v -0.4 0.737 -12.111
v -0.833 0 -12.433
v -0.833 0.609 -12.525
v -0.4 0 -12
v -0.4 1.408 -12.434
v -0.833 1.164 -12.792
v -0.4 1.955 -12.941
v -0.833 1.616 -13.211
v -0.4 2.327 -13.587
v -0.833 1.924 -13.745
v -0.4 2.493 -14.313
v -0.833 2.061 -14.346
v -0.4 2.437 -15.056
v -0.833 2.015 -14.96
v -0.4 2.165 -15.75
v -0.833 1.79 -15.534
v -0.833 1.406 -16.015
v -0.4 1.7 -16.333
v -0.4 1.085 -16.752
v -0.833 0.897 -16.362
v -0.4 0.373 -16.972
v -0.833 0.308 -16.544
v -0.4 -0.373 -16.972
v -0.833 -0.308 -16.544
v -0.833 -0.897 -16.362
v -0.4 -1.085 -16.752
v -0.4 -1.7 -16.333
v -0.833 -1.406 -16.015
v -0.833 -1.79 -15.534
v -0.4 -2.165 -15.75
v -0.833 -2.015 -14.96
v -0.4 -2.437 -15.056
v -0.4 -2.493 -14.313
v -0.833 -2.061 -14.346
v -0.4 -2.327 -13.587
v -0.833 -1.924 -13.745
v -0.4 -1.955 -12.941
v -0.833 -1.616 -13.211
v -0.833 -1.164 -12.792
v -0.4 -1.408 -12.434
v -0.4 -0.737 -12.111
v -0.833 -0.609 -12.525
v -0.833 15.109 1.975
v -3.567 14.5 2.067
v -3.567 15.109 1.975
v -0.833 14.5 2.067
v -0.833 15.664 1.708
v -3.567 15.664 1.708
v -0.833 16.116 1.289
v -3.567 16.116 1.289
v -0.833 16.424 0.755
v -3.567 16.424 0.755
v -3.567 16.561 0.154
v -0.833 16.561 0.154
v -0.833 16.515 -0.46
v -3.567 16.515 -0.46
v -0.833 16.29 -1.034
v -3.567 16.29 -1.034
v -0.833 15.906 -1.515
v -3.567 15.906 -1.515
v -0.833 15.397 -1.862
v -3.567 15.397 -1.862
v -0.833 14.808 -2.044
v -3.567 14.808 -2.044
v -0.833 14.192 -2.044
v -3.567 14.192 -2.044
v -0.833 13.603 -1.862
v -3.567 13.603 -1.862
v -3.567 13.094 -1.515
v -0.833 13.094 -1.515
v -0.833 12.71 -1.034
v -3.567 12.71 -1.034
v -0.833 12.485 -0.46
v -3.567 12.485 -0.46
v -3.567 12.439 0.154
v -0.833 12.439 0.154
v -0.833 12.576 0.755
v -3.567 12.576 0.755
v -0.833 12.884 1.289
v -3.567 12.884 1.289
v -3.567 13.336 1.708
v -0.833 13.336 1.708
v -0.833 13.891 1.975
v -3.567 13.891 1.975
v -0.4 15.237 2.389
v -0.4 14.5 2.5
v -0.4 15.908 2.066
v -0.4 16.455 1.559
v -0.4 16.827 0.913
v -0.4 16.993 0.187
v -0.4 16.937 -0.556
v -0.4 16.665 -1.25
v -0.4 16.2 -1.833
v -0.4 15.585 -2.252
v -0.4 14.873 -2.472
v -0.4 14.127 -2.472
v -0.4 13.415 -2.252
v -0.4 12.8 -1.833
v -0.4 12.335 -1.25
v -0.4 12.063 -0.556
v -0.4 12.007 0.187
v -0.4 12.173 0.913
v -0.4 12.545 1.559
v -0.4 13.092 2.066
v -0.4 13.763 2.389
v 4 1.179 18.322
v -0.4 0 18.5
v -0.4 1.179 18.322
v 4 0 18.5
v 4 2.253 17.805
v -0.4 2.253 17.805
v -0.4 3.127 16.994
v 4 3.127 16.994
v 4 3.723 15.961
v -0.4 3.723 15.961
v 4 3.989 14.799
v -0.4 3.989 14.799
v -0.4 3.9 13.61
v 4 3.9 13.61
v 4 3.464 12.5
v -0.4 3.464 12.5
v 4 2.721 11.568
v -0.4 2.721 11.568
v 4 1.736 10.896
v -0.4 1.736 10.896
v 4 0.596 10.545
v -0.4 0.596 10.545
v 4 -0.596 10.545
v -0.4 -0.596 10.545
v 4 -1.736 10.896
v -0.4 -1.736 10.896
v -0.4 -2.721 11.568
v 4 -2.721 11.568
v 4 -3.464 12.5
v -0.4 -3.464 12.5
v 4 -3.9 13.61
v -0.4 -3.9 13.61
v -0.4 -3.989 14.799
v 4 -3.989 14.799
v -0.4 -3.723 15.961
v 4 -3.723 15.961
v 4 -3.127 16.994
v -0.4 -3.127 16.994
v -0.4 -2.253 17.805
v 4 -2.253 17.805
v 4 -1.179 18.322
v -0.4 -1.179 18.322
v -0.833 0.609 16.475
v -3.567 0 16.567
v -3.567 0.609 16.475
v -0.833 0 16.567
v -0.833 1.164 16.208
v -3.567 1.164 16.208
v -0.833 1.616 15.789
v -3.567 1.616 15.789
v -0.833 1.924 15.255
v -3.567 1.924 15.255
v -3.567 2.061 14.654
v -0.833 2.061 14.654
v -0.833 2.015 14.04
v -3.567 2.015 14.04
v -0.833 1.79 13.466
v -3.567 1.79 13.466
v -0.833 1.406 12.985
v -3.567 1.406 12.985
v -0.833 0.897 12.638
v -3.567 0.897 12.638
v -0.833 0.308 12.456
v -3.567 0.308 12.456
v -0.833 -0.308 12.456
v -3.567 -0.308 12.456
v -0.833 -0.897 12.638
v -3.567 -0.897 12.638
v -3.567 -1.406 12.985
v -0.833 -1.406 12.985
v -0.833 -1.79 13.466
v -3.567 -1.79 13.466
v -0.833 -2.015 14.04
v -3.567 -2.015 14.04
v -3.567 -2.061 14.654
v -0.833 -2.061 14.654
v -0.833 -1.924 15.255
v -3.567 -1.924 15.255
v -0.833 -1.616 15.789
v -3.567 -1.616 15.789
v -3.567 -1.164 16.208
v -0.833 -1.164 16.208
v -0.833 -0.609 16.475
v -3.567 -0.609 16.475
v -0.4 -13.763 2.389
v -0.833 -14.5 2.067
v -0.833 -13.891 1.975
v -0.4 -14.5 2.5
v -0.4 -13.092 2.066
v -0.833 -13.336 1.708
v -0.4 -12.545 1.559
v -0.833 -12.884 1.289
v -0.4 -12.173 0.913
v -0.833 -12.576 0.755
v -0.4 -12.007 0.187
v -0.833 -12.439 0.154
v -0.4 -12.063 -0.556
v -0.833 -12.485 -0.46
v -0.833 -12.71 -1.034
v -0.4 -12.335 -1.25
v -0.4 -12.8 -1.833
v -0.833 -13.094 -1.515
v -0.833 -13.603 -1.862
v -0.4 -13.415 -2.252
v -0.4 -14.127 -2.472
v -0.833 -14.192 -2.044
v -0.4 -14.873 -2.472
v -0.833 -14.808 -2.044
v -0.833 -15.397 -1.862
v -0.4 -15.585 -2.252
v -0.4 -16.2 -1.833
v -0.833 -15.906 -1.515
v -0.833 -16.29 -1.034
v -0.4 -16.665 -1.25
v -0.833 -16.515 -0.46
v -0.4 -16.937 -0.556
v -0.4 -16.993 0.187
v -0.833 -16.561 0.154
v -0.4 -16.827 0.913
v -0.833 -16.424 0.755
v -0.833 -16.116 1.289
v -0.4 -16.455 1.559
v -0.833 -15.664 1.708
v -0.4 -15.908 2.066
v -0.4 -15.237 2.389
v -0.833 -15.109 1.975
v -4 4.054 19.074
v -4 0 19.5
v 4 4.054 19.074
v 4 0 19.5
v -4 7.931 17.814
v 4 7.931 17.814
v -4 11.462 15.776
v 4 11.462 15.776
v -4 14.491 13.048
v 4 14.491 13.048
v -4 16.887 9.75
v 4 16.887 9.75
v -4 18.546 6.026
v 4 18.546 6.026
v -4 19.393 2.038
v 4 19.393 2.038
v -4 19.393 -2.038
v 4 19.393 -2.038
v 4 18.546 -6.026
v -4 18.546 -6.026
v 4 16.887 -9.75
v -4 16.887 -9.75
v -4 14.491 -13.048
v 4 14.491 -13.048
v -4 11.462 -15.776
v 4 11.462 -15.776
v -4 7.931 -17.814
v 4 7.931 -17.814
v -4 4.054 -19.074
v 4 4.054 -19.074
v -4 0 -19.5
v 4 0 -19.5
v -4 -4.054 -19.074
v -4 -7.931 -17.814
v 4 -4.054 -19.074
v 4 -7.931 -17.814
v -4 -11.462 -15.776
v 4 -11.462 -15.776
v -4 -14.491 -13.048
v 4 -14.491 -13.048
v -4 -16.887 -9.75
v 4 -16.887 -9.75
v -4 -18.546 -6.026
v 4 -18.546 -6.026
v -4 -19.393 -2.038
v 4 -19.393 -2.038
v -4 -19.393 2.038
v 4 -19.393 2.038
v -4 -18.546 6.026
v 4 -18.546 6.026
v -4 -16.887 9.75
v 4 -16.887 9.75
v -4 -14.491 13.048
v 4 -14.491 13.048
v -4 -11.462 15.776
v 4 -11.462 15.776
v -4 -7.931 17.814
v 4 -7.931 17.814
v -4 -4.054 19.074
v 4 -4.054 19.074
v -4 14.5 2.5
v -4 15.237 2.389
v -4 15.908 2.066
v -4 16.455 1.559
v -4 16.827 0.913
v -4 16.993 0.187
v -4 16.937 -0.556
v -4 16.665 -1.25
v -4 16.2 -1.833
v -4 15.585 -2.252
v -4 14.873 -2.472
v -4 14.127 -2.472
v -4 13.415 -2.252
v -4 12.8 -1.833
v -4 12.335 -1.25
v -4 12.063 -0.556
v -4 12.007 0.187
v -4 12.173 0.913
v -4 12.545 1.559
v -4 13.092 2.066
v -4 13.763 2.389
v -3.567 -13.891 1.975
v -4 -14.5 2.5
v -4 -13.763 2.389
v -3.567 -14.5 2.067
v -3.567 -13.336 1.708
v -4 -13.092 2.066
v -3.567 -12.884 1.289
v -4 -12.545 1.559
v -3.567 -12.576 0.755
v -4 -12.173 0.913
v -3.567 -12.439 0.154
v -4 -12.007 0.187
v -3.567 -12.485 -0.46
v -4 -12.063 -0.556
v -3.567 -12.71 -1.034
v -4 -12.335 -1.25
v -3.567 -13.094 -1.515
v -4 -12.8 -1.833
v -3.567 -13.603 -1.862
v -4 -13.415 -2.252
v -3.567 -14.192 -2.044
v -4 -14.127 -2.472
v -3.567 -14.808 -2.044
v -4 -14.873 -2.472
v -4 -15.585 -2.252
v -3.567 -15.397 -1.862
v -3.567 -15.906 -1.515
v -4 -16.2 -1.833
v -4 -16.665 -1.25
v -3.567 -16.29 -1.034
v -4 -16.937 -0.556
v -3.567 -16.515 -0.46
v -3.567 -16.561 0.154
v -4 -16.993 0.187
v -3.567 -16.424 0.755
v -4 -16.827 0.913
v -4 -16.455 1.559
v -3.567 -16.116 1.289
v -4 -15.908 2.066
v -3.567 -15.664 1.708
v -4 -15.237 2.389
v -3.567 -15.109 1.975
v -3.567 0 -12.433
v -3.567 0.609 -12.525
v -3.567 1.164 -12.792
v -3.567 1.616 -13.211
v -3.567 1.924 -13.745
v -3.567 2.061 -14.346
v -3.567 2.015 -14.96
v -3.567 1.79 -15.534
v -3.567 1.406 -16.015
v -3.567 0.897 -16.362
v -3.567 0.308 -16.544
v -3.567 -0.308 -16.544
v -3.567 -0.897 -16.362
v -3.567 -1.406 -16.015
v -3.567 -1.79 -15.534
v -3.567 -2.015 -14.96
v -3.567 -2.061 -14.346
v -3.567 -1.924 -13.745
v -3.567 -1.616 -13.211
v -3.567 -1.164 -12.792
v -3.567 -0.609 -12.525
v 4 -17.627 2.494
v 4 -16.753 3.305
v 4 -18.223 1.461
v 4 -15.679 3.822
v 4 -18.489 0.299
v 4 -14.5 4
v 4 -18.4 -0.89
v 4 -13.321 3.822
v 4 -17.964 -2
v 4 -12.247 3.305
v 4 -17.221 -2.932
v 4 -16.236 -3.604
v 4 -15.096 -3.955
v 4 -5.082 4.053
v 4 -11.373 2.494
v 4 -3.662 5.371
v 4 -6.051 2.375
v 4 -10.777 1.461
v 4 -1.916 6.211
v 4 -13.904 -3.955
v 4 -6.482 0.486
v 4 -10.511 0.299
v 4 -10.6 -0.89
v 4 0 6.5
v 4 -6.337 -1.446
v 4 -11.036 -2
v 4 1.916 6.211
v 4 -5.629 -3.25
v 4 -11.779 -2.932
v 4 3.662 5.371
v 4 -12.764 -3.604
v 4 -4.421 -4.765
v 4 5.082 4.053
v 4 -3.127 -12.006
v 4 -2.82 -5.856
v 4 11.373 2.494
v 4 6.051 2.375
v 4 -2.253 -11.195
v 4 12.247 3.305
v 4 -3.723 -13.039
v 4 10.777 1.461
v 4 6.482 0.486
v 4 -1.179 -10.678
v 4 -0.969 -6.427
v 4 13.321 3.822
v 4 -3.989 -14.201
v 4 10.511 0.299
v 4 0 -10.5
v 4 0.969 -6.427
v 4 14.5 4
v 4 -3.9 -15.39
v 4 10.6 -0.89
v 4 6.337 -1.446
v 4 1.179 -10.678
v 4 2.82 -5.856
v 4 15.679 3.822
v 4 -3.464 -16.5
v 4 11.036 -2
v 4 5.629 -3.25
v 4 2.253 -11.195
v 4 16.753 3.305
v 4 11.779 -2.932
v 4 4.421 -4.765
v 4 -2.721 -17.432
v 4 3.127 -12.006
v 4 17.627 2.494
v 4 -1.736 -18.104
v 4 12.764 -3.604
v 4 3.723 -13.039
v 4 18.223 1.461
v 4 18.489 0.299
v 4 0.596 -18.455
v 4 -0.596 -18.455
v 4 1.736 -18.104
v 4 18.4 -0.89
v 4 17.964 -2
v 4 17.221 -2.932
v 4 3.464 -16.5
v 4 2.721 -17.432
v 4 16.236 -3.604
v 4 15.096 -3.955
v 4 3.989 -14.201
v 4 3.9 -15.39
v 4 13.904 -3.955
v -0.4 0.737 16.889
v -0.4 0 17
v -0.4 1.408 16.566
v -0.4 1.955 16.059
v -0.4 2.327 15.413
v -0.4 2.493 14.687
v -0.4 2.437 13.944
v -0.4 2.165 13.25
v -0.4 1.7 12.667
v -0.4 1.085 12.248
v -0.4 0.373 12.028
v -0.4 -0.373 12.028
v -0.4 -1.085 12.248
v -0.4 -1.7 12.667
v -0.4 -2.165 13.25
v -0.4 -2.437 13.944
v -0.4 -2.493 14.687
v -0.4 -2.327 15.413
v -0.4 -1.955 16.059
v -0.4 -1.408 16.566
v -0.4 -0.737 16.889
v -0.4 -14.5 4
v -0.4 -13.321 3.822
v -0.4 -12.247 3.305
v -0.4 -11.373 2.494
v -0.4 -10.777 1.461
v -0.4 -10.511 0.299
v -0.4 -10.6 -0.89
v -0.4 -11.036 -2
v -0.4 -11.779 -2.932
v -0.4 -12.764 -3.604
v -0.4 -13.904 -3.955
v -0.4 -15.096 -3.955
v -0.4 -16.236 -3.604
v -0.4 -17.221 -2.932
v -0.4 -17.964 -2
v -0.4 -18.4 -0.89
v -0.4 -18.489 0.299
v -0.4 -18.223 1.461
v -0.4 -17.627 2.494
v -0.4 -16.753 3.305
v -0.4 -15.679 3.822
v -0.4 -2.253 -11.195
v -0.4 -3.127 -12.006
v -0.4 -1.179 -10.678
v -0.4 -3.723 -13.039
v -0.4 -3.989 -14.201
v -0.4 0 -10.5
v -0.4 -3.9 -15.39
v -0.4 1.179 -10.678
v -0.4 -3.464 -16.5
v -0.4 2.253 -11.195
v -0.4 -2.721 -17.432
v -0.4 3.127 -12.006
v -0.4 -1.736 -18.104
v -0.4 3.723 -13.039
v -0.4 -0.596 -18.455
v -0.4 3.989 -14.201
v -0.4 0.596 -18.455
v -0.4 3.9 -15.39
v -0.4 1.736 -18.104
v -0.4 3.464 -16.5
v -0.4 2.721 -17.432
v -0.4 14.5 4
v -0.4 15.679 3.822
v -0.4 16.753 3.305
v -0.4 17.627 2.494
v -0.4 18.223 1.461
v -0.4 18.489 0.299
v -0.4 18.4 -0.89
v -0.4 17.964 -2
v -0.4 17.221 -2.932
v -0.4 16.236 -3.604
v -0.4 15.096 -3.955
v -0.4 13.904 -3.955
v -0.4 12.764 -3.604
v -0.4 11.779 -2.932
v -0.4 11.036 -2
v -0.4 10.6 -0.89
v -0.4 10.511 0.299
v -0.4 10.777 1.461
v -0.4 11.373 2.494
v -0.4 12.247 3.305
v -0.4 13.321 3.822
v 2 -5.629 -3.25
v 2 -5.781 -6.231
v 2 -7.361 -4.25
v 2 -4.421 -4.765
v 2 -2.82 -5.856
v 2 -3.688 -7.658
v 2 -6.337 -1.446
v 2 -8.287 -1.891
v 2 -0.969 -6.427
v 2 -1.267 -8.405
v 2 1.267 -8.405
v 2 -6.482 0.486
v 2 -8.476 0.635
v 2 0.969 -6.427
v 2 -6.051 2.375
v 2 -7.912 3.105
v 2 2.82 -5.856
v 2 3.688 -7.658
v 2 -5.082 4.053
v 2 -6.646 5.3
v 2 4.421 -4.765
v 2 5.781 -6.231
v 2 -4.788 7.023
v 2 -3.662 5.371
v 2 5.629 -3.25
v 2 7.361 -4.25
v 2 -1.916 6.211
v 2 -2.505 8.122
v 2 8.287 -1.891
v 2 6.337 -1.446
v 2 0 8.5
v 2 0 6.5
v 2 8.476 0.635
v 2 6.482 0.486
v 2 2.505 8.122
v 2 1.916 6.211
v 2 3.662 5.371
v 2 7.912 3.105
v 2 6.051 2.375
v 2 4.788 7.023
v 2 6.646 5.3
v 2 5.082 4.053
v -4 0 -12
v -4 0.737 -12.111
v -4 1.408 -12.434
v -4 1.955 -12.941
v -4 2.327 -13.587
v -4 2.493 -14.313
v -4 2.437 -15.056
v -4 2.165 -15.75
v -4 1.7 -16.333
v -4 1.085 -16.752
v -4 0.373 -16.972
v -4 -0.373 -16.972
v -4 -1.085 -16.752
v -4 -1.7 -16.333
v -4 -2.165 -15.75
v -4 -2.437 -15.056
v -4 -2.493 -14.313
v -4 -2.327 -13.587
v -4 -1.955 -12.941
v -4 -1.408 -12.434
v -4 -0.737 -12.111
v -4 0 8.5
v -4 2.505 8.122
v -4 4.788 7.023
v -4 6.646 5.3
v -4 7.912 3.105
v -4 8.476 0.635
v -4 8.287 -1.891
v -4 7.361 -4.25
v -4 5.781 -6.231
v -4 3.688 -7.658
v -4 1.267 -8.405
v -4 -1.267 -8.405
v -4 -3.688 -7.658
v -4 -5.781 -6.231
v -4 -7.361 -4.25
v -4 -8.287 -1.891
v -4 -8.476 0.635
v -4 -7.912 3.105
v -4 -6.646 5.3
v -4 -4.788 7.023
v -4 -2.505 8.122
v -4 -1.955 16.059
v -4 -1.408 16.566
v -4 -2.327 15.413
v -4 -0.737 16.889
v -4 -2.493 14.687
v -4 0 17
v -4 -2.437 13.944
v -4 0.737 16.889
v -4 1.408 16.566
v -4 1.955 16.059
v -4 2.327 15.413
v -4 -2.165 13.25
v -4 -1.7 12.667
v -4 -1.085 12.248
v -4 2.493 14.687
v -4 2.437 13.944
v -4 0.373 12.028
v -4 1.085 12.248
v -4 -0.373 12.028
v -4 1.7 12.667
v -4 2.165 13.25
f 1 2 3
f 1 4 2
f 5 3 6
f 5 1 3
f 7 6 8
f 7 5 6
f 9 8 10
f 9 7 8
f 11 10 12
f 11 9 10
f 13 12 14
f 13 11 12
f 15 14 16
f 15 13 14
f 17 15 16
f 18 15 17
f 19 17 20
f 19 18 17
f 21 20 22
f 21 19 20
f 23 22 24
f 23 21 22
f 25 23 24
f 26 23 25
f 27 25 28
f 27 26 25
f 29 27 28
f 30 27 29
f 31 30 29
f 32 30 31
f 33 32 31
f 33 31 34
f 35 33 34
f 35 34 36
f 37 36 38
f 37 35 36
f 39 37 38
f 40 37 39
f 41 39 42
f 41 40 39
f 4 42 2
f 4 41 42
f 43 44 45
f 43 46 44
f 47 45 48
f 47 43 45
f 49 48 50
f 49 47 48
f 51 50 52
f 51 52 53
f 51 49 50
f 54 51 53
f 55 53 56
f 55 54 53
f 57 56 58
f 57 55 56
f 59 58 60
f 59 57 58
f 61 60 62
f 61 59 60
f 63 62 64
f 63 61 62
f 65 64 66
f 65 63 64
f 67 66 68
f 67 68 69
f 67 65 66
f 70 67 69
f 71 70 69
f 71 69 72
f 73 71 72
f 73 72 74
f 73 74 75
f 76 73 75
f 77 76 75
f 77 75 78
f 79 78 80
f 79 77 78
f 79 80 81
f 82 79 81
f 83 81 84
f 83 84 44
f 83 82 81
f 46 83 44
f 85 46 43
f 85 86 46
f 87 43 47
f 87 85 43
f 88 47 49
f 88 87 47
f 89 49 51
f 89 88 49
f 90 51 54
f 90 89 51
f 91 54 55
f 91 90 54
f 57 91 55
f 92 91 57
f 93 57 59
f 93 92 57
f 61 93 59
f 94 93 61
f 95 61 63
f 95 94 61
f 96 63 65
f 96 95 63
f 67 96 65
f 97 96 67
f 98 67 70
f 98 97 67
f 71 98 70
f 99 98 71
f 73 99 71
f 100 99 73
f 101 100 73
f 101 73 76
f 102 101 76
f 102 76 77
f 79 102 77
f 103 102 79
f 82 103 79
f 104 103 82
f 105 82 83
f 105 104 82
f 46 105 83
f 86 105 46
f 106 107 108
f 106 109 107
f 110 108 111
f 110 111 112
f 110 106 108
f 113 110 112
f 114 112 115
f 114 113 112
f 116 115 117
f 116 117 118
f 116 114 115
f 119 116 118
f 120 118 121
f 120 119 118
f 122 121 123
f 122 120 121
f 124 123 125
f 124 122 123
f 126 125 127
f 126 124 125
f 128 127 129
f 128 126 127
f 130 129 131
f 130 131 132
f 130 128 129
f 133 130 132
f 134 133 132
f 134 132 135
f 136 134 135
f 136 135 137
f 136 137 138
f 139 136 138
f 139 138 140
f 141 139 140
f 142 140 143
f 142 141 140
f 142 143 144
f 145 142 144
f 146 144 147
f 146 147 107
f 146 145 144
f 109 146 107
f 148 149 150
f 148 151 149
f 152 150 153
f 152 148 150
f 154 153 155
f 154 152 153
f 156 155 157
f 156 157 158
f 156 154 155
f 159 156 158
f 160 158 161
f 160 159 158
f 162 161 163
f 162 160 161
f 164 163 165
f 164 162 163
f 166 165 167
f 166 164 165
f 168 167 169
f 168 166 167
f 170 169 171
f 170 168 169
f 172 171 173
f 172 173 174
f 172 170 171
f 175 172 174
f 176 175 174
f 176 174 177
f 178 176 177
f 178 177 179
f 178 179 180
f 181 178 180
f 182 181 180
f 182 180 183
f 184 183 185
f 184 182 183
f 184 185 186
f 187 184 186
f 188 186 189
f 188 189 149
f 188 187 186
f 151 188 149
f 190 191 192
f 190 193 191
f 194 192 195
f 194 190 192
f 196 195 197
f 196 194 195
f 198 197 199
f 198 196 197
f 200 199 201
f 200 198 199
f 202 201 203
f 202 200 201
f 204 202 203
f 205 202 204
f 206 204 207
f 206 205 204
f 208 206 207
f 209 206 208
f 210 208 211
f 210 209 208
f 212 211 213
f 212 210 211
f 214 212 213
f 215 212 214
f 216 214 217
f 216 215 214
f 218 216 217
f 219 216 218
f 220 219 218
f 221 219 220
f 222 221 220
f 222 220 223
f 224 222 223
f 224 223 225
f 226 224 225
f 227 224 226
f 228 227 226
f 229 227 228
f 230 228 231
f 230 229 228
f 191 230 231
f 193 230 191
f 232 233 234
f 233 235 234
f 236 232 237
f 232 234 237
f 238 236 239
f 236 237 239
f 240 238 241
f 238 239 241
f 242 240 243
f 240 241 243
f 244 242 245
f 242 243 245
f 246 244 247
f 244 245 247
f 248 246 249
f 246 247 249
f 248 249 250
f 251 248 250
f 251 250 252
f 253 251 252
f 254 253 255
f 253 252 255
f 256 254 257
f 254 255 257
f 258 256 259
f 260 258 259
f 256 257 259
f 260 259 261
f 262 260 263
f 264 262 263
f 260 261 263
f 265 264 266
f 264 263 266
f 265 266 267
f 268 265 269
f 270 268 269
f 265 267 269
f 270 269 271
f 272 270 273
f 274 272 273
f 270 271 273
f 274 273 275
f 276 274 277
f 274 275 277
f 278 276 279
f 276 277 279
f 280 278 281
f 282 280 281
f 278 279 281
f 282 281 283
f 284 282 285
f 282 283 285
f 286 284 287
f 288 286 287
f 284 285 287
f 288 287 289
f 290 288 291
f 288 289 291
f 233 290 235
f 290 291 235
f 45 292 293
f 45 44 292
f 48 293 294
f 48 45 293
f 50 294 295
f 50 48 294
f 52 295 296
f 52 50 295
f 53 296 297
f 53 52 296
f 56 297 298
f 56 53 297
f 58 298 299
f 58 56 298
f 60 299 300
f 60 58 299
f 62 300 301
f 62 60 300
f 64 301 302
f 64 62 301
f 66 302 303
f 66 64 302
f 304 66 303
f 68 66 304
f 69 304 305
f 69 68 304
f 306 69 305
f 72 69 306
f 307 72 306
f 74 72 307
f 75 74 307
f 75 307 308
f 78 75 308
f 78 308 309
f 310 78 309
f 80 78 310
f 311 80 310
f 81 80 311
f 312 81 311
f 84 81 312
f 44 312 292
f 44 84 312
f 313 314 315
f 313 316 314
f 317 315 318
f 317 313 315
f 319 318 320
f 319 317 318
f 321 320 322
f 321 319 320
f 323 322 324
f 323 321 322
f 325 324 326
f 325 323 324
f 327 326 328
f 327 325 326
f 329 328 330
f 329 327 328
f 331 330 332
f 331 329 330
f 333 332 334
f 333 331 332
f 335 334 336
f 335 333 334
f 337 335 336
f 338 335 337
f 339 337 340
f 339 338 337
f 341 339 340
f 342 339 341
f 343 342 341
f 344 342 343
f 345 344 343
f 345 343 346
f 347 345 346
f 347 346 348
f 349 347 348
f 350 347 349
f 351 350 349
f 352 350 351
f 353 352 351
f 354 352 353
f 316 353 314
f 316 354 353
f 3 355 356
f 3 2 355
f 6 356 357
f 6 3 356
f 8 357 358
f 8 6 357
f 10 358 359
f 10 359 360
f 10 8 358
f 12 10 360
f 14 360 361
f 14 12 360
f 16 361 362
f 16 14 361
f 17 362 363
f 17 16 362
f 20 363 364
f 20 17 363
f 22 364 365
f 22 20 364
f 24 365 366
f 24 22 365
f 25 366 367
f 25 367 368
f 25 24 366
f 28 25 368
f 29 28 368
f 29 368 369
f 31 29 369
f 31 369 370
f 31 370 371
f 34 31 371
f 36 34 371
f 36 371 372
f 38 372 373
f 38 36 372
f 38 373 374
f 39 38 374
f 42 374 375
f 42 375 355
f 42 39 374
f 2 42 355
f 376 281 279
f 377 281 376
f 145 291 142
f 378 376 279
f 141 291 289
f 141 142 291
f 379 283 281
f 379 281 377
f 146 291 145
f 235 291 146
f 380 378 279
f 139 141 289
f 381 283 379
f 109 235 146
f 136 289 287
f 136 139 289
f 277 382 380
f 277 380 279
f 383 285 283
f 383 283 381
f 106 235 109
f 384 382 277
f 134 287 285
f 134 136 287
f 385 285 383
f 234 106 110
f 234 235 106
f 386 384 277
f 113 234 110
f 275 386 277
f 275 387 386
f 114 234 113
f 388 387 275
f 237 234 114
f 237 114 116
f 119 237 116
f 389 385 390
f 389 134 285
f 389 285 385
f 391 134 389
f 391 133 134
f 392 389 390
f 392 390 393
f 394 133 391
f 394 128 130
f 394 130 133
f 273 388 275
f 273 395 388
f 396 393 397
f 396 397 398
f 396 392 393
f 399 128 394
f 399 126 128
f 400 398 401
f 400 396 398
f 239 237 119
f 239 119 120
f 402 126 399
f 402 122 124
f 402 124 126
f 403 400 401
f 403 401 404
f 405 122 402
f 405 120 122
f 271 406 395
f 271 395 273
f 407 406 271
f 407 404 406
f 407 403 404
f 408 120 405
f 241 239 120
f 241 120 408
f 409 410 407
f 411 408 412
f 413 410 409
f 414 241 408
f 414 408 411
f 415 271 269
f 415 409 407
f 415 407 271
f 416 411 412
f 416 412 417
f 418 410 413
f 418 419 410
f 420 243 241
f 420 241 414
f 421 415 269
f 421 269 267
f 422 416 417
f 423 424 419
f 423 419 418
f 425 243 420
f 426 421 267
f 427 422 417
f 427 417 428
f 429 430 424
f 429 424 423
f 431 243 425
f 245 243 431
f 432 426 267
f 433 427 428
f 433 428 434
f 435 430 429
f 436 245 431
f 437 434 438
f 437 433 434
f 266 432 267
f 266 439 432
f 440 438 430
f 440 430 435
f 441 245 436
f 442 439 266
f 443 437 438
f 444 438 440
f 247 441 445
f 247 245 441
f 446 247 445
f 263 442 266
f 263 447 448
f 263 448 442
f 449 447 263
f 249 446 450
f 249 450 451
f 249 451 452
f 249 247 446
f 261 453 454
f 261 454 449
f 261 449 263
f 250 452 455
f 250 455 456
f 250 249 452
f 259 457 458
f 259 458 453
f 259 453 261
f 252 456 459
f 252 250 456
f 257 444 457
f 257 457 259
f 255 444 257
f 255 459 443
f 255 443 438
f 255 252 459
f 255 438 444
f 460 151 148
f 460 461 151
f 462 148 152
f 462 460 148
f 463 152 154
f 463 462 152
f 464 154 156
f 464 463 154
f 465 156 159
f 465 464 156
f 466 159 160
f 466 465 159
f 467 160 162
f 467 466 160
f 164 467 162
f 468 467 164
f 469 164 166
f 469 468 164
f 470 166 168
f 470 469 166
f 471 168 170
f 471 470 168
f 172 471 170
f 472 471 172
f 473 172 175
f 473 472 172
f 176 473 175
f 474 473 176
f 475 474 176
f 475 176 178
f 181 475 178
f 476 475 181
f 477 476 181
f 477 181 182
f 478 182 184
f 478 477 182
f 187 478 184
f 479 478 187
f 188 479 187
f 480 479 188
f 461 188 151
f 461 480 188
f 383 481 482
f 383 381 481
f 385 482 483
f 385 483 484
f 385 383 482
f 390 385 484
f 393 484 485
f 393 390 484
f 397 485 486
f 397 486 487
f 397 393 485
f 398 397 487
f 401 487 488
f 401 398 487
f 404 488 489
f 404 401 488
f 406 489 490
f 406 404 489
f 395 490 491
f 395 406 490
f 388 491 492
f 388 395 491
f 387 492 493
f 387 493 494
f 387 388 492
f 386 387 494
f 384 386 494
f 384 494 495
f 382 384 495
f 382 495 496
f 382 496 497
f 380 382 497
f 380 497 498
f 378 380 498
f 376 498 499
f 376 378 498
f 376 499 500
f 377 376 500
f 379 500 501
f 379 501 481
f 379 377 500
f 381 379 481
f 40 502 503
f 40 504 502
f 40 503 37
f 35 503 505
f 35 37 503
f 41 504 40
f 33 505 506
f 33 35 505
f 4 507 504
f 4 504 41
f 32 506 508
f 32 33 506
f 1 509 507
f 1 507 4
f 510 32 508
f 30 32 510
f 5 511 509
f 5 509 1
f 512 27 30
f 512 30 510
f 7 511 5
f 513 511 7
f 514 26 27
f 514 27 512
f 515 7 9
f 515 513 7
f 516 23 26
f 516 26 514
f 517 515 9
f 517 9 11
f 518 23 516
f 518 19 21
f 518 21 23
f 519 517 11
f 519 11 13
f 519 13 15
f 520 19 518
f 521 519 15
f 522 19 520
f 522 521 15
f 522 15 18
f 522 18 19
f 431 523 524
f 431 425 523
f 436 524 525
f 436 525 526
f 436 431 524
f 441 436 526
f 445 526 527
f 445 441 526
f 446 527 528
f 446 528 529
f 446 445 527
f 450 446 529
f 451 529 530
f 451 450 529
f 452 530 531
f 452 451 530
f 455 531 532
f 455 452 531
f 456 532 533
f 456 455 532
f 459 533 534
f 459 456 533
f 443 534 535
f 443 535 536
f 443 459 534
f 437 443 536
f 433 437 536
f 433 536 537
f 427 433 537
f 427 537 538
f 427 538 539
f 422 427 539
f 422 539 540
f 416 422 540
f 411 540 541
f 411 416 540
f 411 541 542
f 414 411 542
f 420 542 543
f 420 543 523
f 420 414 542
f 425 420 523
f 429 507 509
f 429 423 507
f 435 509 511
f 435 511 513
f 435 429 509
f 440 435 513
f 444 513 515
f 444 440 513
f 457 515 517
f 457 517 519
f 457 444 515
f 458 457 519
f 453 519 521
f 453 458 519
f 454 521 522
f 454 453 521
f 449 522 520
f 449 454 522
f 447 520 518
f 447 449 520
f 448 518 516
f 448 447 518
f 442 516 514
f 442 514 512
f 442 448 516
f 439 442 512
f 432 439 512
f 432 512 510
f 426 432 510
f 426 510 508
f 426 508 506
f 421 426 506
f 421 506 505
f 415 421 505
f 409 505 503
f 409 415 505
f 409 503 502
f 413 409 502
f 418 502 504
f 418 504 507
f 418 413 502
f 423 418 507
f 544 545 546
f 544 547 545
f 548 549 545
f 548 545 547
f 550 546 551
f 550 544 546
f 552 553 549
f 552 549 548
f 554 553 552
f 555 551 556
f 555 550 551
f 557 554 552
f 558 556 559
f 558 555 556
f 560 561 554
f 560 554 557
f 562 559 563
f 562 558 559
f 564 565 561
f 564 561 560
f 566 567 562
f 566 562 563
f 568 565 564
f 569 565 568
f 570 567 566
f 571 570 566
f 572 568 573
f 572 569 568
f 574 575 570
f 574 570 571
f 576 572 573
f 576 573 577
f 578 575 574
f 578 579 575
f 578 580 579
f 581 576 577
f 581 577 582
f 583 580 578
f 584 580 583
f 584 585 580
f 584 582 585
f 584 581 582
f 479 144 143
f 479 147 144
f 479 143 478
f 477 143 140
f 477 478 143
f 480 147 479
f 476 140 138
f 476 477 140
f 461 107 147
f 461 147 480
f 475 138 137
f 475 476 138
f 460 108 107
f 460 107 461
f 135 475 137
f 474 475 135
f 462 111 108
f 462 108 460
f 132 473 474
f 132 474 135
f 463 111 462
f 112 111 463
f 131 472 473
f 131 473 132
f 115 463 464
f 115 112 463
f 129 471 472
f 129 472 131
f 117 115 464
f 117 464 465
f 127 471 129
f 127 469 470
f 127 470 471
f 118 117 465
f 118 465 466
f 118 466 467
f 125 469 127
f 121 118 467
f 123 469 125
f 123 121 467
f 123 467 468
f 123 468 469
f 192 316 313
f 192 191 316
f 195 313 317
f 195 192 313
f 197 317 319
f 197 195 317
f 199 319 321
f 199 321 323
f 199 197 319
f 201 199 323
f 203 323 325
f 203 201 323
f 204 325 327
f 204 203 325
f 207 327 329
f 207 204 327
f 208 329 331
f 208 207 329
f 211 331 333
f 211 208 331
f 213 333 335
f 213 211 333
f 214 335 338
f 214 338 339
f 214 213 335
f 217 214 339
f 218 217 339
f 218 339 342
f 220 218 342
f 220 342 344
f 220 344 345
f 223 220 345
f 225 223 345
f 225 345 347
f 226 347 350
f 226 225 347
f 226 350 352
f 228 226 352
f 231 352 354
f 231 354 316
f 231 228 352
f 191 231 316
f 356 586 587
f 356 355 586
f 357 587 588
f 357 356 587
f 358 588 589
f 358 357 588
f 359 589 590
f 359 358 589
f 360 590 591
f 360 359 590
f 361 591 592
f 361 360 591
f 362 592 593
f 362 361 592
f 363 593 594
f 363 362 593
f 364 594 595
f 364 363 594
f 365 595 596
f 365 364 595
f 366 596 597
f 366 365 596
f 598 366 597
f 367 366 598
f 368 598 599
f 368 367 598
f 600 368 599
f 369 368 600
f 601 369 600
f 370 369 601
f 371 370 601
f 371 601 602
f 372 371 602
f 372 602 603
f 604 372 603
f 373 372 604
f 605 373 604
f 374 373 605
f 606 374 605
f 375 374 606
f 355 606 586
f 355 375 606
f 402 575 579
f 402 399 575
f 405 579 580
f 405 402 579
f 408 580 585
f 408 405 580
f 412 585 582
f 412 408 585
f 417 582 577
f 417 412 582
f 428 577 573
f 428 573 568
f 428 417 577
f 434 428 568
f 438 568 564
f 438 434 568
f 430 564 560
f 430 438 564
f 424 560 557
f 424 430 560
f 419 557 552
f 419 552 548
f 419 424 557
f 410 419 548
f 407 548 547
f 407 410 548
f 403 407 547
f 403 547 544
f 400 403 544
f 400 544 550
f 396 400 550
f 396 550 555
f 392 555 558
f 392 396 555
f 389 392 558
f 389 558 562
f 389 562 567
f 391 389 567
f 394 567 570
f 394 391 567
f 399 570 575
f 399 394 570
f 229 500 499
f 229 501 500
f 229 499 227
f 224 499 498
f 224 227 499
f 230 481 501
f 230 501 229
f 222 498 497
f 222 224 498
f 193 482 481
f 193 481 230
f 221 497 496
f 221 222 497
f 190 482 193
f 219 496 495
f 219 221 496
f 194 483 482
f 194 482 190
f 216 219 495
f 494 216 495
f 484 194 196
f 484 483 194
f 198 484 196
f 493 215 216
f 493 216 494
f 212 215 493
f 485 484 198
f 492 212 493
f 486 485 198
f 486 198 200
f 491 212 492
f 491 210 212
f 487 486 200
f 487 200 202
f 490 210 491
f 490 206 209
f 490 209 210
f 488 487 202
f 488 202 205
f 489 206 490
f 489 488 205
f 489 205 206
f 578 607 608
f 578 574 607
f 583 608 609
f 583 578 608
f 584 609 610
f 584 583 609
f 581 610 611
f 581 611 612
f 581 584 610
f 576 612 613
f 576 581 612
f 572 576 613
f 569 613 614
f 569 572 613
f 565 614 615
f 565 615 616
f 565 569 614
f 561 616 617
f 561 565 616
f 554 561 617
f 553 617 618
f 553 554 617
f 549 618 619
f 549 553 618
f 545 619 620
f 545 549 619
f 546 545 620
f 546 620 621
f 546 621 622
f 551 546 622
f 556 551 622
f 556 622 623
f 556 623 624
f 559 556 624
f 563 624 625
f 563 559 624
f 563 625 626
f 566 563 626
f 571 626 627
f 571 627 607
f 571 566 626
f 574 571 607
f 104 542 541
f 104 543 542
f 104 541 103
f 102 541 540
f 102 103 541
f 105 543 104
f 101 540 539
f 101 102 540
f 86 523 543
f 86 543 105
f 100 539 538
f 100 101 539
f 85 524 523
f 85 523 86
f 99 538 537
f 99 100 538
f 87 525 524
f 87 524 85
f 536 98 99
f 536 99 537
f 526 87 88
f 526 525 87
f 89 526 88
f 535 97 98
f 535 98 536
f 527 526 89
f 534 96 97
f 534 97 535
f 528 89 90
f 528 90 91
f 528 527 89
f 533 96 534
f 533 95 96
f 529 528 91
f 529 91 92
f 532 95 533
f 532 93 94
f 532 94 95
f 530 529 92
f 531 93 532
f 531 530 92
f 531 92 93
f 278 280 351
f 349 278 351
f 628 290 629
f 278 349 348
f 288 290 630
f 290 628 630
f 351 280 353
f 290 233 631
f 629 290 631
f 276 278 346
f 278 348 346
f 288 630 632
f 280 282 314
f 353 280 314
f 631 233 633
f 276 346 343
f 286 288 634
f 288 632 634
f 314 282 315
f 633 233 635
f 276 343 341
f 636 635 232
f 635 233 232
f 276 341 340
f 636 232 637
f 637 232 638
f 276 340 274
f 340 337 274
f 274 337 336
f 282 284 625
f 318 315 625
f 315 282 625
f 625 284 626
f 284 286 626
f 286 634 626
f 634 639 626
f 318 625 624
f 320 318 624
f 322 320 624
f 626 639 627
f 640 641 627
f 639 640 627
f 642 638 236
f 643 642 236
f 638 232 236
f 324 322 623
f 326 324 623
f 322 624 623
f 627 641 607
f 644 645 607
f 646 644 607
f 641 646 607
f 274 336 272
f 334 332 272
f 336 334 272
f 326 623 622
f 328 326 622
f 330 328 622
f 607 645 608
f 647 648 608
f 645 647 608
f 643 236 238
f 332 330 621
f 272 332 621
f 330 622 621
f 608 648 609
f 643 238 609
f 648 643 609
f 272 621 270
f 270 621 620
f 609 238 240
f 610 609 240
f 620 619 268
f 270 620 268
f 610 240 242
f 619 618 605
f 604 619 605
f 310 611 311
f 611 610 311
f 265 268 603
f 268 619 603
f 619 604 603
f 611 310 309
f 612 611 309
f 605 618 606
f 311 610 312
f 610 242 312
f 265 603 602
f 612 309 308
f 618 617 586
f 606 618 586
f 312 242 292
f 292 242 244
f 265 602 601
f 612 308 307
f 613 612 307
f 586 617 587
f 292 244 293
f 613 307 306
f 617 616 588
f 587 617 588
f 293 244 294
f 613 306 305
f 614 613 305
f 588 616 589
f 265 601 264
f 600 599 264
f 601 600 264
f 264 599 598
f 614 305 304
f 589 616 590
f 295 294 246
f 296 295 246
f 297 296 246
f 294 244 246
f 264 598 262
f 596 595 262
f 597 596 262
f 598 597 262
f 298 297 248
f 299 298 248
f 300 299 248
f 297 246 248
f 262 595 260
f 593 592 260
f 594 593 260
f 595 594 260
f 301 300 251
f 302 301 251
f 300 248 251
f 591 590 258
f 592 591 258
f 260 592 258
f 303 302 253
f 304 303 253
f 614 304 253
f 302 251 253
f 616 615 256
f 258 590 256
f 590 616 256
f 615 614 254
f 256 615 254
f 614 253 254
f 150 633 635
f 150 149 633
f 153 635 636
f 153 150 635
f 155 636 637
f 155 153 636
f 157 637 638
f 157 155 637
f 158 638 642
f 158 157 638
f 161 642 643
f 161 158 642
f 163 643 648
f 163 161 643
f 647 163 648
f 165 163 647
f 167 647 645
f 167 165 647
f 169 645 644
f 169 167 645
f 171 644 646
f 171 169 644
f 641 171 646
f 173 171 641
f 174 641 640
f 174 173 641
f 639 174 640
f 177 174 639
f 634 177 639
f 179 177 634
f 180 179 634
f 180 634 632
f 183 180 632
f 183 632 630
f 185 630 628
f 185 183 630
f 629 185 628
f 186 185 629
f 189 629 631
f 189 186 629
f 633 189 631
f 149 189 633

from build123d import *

# Parameters (mm, degrees)
SKETCH_1_W = 8
SKETCH_1_H = 19.5


with BuildPart() as part:
    # ｽｹｯﾁ1 → 回転1 (revolve)
    with BuildSketch(Plane.XY, mode=Mode.PRIVATE) as revolve_1_sk:
        with Locations((0, 9.75)):
            Rectangle(SKETCH_1_W, SKETCH_1_H)
    revolve(revolve_1_sk.sketch.rotate(Axis((4, 0, 0), (-1, 0, 0)), 270), axis=Axis((4, 0, 0), (-1, 0, 0)))

    # ｽｹｯﾁ2 → ｶｯﾄ - 回転1 (revolve, cut)
    with BuildSketch(Plane.XY, mode=Mode.PRIVATE) as cut_revolve_1_sk:
        Polygon((-4, 0), (-4, 8.5), (2, 8.5), (2, 6.5), (4, 6.5), (4, 0), align=None)
    revolve(cut_revolve_1_sk.sketch.rotate(Axis((4, 0, 0), (-1, 0, 0)), 270), axis=Axis((4, 0, 0), (-1, 0, 0)), mode=Mode.SUBTRACT)

    # ｽｹｯﾁ3 → ｶｯﾄ - 回転2 (revolve, cut)
    with BuildSketch(Plane.XY, mode=Mode.PRIVATE) as cut_revolve_2_sk:
        Polygon((-4, 14.5), (-4, 17), (-3.567, 16.567), (-0.833, 16.567), (-0.4, 17), (-0.4, 18.5), (4, 18.5), (4, 14.5), align=None)
    revolve(cut_revolve_2_sk.sketch.rotate(Axis((4, 14.5, 0), (-1, 0, 0)), 270), axis=Axis((4, 14.5, 0), (-1, 0, 0)), mode=Mode.SUBTRACT)

    # ｽｹｯﾁ4 → ｶｯﾄ - 回転3 (revolve, cut)
    with BuildSketch(Plane.XY.offset(14.5), mode=Mode.PRIVATE) as cut_revolve_3_sk:
        Polygon((-4, 0), (-4, 2.5), (-3.567, 2.067), (-0.833, 2.067), (-0.4, 2.5), (-0.4, 4), (4, 4), (4, 0), align=None)
    revolve(cut_revolve_3_sk.sketch.rotate(Axis((4, 0, 14.5), (-1, 0, 0)), 270), axis=Axis((4, 0, 14.5), (-1, 0, 0)), mode=Mode.SUBTRACT)

    # ｽｹｯﾁ5 → ｶｯﾄ - 回転4 (revolve, cut)
    with BuildSketch(Plane.XY, mode=Mode.PRIVATE) as cut_revolve_4_sk:
        Polygon((-4, -14.5), (-4, -12), (-3.567, -12.433), (-0.833, -12.433), (-0.4, -12), (-0.4, -10.5), (4, -10.5), (4, -14.5), align=None)
    revolve(cut_revolve_4_sk.sketch.rotate(Axis((4, -14.5, 0), (-1, 0, 0)), 270), axis=Axis((4, -14.5, 0), (-1, 0, 0)), mode=Mode.SUBTRACT)

    # ｽｹｯﾁ6 → ｶｯﾄ - 回転5 (revolve, cut)
    with BuildSketch(Plane.XY.offset(-14.5), mode=Mode.PRIVATE) as cut_revolve_5_sk:
        Polygon((-4, 0), (-4, 2.5), (-3.567, 2.067), (-0.833, 2.067), (-0.4, 2.5), (-0.4, 4), (4, 4), (4, 0), align=None)
    revolve(cut_revolve_5_sk.sketch.rotate(Axis((4, 0, -14.5), (-1, 0, 0)), 270), axis=Axis((4, 0, -14.5), (-1, 0, 0)), mode=Mode.SUBTRACT)


solid = part.part
